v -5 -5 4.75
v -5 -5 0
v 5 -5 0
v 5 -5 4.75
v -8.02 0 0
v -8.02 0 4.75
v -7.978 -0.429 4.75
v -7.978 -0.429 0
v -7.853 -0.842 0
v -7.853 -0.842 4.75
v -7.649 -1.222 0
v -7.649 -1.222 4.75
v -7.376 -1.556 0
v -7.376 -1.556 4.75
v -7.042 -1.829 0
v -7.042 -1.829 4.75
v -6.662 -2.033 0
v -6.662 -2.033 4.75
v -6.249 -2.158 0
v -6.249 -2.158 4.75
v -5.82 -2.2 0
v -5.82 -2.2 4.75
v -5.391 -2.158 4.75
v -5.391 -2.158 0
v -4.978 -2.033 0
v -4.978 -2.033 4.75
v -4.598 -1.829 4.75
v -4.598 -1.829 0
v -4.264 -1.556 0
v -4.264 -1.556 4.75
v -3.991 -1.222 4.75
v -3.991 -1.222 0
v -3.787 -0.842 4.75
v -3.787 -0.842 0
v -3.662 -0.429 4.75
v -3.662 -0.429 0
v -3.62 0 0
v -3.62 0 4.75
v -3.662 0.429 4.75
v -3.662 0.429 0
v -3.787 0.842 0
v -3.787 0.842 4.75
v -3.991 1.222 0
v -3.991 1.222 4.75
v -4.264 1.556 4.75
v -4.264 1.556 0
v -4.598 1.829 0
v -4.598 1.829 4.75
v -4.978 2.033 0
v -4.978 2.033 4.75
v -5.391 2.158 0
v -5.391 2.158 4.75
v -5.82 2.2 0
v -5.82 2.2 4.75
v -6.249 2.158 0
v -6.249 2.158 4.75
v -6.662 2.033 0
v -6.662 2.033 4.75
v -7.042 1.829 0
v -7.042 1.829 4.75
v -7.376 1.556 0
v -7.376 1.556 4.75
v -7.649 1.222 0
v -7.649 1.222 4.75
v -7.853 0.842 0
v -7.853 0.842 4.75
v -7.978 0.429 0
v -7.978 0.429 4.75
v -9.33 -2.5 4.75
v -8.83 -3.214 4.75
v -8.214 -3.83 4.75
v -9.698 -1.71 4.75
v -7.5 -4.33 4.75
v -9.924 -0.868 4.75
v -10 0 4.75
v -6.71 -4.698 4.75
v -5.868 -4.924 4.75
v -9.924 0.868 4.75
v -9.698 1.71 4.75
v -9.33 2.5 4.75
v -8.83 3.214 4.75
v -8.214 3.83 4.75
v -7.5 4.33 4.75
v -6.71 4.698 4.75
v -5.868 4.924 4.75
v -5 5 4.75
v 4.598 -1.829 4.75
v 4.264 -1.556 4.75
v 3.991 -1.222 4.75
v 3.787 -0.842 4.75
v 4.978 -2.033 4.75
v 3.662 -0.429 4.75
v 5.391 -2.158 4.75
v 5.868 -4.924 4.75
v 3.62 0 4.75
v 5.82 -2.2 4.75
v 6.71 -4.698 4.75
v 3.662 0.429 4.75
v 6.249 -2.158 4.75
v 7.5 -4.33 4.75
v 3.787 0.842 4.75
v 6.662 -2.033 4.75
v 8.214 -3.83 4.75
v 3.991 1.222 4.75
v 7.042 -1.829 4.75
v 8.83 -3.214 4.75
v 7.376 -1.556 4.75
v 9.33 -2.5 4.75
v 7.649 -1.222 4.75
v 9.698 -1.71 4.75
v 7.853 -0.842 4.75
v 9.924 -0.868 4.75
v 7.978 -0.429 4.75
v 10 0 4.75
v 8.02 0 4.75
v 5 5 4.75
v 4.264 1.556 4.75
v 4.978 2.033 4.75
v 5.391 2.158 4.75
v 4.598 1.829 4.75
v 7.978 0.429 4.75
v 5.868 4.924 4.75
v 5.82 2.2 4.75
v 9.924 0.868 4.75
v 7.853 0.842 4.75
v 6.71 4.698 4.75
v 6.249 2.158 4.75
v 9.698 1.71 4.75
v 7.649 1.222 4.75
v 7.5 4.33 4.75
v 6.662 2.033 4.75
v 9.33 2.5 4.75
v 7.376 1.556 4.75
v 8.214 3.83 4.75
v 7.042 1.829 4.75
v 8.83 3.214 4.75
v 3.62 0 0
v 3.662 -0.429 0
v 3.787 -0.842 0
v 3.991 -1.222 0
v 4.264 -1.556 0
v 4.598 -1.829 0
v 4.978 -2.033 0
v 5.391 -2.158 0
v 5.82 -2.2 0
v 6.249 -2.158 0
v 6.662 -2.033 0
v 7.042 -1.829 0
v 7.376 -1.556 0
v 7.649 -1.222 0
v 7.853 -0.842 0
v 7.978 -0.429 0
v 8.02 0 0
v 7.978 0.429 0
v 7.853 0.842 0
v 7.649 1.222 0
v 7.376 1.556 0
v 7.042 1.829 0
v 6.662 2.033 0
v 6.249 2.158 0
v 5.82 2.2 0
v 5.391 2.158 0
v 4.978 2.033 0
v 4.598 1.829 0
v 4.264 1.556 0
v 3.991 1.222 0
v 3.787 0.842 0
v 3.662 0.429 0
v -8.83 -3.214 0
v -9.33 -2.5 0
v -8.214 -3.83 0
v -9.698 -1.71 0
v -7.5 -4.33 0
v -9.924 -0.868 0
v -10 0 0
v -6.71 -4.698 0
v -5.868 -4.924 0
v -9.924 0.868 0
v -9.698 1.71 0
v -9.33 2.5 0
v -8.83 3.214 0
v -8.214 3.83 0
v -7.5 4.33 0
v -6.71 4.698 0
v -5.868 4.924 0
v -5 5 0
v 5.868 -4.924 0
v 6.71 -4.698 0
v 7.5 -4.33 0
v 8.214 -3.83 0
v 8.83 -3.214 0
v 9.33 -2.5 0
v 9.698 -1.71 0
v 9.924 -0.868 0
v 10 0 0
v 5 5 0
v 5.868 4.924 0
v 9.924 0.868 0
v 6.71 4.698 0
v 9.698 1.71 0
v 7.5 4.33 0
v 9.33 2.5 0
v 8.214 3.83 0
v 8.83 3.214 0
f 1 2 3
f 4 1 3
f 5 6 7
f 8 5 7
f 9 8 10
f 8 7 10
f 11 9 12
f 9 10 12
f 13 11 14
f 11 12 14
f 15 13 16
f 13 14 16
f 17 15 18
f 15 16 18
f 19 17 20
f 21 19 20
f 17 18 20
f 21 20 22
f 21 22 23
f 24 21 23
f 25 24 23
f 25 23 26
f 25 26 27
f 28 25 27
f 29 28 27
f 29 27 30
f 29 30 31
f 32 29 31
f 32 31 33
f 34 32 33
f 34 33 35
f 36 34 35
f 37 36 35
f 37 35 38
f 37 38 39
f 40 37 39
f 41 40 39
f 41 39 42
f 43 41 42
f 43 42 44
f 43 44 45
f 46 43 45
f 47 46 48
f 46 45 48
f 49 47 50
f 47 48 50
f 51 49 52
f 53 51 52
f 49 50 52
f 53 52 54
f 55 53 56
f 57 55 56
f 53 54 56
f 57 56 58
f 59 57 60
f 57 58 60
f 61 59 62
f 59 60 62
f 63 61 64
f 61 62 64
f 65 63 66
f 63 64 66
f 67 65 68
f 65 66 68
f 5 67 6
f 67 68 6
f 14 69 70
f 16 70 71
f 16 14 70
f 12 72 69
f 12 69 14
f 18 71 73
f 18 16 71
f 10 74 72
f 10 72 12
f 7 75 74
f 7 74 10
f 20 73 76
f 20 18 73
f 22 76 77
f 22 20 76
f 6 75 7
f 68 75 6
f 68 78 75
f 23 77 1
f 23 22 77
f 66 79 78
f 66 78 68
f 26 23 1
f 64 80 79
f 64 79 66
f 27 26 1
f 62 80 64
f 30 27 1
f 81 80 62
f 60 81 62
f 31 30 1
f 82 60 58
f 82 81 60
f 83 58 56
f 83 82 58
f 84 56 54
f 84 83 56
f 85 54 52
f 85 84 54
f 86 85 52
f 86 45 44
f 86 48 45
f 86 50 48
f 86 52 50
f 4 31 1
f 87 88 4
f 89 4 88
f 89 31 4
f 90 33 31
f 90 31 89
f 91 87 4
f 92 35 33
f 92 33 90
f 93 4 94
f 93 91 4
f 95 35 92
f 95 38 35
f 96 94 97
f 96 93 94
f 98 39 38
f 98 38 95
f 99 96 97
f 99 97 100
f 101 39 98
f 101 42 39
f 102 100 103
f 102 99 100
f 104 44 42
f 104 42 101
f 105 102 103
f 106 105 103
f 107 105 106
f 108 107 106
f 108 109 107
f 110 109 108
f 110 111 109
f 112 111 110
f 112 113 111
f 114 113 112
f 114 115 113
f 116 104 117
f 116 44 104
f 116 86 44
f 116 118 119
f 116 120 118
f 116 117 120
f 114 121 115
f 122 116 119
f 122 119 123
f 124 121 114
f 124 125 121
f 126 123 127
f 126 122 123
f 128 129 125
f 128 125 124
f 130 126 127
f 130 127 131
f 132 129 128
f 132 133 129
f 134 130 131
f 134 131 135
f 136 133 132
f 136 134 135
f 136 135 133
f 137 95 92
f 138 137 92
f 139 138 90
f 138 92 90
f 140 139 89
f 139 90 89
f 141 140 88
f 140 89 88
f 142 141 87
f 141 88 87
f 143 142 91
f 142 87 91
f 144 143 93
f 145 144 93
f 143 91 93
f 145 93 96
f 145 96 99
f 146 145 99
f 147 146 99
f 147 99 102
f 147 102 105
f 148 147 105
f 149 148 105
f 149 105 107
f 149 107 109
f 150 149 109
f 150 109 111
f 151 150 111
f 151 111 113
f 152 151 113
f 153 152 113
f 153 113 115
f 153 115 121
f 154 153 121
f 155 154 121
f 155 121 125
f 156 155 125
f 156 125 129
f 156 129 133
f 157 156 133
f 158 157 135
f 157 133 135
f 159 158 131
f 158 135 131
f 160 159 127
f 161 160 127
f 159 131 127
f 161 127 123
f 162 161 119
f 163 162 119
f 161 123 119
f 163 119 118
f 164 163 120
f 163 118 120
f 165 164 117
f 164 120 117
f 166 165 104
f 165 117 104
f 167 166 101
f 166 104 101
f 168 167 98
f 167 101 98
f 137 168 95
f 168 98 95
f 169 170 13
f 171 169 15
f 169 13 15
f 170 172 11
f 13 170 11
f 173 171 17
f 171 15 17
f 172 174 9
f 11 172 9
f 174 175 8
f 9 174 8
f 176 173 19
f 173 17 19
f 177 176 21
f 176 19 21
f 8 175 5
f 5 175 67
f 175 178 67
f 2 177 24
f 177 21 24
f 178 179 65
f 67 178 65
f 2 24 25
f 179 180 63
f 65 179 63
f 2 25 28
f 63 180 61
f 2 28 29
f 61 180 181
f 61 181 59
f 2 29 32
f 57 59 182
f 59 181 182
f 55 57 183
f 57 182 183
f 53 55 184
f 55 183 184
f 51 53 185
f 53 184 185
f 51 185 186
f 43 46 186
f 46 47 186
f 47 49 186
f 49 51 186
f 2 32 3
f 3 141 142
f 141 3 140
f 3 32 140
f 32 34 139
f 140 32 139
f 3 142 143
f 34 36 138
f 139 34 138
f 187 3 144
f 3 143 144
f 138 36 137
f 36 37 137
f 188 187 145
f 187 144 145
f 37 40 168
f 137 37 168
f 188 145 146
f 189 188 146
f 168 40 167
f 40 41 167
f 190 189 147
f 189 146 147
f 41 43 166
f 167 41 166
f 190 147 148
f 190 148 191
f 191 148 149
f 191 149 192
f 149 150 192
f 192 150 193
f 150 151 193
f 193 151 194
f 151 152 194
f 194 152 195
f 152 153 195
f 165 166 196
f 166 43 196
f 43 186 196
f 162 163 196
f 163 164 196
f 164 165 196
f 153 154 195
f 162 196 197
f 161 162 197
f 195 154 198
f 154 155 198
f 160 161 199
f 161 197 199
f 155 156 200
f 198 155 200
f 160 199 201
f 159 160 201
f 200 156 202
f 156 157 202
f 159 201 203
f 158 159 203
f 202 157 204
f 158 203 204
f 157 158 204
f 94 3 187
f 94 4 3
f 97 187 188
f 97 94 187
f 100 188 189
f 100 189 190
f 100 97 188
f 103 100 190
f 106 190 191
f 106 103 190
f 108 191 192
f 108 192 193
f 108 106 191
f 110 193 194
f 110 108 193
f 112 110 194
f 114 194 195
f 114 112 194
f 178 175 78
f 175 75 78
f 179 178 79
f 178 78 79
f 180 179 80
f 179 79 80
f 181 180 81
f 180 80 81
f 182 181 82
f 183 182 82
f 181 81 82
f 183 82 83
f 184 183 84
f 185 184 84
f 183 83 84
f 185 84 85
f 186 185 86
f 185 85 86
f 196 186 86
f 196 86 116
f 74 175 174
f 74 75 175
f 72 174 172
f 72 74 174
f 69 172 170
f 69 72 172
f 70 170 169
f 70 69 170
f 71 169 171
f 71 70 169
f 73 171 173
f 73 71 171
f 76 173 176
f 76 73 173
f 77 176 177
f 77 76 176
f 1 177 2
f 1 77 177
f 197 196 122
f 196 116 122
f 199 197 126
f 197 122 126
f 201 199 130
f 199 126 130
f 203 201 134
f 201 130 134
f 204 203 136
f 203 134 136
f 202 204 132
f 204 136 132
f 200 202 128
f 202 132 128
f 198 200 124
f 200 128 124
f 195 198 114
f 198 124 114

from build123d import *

# Parameters (mm, degrees)
F0_W     = 20
F0_H     = 10
F1_DEPTH = 4.75
F2_D     = 4.4
F2_DEPTH = 25
F2_TIP   = 1.3218933619
F3_R     = 4.99999


# Not quite as in the source:
# - a fillet or chamfer is up to 0.001 mm smaller than in the source, because OpenCascade refuses the exact size


with BuildPart() as f1:
    # F0 (on Top) → F1 (new body)
    with BuildSketch(Plane.XY):
        Rectangle(F0_W, F0_H)
    extrude(amount=F1_DEPTH)

    # F2
    with Locations(Plane(origin=(0, 0, 0), x_dir=(1, 0, 0), z_dir=(0, 0, -1))):
        with Locations((-5.82, 0), (5.82, 0)):
            Hole(F2_D / 2, depth=F2_DEPTH)
            with Locations((0, 0, -(F2_DEPTH + F2_TIP / 2))):  # 118° drill point
                Cone(0, F2_D / 2, F2_TIP, mode=Mode.SUBTRACT)

    # F3 (radius 5 in the source; OpenCascade refuses exactly that, so slightly less here)
    f3_edges = [f1.edges().sort_by_distance(p)[0] for p in [
        (10, 5, 2.375),
        (10, -5, 2.375),
        (-10, 5, 2.375),
        (-10, -5, 2.375),
    ]]
    fillet(f3_edges, radius=F3_R)


solid = f1.part
